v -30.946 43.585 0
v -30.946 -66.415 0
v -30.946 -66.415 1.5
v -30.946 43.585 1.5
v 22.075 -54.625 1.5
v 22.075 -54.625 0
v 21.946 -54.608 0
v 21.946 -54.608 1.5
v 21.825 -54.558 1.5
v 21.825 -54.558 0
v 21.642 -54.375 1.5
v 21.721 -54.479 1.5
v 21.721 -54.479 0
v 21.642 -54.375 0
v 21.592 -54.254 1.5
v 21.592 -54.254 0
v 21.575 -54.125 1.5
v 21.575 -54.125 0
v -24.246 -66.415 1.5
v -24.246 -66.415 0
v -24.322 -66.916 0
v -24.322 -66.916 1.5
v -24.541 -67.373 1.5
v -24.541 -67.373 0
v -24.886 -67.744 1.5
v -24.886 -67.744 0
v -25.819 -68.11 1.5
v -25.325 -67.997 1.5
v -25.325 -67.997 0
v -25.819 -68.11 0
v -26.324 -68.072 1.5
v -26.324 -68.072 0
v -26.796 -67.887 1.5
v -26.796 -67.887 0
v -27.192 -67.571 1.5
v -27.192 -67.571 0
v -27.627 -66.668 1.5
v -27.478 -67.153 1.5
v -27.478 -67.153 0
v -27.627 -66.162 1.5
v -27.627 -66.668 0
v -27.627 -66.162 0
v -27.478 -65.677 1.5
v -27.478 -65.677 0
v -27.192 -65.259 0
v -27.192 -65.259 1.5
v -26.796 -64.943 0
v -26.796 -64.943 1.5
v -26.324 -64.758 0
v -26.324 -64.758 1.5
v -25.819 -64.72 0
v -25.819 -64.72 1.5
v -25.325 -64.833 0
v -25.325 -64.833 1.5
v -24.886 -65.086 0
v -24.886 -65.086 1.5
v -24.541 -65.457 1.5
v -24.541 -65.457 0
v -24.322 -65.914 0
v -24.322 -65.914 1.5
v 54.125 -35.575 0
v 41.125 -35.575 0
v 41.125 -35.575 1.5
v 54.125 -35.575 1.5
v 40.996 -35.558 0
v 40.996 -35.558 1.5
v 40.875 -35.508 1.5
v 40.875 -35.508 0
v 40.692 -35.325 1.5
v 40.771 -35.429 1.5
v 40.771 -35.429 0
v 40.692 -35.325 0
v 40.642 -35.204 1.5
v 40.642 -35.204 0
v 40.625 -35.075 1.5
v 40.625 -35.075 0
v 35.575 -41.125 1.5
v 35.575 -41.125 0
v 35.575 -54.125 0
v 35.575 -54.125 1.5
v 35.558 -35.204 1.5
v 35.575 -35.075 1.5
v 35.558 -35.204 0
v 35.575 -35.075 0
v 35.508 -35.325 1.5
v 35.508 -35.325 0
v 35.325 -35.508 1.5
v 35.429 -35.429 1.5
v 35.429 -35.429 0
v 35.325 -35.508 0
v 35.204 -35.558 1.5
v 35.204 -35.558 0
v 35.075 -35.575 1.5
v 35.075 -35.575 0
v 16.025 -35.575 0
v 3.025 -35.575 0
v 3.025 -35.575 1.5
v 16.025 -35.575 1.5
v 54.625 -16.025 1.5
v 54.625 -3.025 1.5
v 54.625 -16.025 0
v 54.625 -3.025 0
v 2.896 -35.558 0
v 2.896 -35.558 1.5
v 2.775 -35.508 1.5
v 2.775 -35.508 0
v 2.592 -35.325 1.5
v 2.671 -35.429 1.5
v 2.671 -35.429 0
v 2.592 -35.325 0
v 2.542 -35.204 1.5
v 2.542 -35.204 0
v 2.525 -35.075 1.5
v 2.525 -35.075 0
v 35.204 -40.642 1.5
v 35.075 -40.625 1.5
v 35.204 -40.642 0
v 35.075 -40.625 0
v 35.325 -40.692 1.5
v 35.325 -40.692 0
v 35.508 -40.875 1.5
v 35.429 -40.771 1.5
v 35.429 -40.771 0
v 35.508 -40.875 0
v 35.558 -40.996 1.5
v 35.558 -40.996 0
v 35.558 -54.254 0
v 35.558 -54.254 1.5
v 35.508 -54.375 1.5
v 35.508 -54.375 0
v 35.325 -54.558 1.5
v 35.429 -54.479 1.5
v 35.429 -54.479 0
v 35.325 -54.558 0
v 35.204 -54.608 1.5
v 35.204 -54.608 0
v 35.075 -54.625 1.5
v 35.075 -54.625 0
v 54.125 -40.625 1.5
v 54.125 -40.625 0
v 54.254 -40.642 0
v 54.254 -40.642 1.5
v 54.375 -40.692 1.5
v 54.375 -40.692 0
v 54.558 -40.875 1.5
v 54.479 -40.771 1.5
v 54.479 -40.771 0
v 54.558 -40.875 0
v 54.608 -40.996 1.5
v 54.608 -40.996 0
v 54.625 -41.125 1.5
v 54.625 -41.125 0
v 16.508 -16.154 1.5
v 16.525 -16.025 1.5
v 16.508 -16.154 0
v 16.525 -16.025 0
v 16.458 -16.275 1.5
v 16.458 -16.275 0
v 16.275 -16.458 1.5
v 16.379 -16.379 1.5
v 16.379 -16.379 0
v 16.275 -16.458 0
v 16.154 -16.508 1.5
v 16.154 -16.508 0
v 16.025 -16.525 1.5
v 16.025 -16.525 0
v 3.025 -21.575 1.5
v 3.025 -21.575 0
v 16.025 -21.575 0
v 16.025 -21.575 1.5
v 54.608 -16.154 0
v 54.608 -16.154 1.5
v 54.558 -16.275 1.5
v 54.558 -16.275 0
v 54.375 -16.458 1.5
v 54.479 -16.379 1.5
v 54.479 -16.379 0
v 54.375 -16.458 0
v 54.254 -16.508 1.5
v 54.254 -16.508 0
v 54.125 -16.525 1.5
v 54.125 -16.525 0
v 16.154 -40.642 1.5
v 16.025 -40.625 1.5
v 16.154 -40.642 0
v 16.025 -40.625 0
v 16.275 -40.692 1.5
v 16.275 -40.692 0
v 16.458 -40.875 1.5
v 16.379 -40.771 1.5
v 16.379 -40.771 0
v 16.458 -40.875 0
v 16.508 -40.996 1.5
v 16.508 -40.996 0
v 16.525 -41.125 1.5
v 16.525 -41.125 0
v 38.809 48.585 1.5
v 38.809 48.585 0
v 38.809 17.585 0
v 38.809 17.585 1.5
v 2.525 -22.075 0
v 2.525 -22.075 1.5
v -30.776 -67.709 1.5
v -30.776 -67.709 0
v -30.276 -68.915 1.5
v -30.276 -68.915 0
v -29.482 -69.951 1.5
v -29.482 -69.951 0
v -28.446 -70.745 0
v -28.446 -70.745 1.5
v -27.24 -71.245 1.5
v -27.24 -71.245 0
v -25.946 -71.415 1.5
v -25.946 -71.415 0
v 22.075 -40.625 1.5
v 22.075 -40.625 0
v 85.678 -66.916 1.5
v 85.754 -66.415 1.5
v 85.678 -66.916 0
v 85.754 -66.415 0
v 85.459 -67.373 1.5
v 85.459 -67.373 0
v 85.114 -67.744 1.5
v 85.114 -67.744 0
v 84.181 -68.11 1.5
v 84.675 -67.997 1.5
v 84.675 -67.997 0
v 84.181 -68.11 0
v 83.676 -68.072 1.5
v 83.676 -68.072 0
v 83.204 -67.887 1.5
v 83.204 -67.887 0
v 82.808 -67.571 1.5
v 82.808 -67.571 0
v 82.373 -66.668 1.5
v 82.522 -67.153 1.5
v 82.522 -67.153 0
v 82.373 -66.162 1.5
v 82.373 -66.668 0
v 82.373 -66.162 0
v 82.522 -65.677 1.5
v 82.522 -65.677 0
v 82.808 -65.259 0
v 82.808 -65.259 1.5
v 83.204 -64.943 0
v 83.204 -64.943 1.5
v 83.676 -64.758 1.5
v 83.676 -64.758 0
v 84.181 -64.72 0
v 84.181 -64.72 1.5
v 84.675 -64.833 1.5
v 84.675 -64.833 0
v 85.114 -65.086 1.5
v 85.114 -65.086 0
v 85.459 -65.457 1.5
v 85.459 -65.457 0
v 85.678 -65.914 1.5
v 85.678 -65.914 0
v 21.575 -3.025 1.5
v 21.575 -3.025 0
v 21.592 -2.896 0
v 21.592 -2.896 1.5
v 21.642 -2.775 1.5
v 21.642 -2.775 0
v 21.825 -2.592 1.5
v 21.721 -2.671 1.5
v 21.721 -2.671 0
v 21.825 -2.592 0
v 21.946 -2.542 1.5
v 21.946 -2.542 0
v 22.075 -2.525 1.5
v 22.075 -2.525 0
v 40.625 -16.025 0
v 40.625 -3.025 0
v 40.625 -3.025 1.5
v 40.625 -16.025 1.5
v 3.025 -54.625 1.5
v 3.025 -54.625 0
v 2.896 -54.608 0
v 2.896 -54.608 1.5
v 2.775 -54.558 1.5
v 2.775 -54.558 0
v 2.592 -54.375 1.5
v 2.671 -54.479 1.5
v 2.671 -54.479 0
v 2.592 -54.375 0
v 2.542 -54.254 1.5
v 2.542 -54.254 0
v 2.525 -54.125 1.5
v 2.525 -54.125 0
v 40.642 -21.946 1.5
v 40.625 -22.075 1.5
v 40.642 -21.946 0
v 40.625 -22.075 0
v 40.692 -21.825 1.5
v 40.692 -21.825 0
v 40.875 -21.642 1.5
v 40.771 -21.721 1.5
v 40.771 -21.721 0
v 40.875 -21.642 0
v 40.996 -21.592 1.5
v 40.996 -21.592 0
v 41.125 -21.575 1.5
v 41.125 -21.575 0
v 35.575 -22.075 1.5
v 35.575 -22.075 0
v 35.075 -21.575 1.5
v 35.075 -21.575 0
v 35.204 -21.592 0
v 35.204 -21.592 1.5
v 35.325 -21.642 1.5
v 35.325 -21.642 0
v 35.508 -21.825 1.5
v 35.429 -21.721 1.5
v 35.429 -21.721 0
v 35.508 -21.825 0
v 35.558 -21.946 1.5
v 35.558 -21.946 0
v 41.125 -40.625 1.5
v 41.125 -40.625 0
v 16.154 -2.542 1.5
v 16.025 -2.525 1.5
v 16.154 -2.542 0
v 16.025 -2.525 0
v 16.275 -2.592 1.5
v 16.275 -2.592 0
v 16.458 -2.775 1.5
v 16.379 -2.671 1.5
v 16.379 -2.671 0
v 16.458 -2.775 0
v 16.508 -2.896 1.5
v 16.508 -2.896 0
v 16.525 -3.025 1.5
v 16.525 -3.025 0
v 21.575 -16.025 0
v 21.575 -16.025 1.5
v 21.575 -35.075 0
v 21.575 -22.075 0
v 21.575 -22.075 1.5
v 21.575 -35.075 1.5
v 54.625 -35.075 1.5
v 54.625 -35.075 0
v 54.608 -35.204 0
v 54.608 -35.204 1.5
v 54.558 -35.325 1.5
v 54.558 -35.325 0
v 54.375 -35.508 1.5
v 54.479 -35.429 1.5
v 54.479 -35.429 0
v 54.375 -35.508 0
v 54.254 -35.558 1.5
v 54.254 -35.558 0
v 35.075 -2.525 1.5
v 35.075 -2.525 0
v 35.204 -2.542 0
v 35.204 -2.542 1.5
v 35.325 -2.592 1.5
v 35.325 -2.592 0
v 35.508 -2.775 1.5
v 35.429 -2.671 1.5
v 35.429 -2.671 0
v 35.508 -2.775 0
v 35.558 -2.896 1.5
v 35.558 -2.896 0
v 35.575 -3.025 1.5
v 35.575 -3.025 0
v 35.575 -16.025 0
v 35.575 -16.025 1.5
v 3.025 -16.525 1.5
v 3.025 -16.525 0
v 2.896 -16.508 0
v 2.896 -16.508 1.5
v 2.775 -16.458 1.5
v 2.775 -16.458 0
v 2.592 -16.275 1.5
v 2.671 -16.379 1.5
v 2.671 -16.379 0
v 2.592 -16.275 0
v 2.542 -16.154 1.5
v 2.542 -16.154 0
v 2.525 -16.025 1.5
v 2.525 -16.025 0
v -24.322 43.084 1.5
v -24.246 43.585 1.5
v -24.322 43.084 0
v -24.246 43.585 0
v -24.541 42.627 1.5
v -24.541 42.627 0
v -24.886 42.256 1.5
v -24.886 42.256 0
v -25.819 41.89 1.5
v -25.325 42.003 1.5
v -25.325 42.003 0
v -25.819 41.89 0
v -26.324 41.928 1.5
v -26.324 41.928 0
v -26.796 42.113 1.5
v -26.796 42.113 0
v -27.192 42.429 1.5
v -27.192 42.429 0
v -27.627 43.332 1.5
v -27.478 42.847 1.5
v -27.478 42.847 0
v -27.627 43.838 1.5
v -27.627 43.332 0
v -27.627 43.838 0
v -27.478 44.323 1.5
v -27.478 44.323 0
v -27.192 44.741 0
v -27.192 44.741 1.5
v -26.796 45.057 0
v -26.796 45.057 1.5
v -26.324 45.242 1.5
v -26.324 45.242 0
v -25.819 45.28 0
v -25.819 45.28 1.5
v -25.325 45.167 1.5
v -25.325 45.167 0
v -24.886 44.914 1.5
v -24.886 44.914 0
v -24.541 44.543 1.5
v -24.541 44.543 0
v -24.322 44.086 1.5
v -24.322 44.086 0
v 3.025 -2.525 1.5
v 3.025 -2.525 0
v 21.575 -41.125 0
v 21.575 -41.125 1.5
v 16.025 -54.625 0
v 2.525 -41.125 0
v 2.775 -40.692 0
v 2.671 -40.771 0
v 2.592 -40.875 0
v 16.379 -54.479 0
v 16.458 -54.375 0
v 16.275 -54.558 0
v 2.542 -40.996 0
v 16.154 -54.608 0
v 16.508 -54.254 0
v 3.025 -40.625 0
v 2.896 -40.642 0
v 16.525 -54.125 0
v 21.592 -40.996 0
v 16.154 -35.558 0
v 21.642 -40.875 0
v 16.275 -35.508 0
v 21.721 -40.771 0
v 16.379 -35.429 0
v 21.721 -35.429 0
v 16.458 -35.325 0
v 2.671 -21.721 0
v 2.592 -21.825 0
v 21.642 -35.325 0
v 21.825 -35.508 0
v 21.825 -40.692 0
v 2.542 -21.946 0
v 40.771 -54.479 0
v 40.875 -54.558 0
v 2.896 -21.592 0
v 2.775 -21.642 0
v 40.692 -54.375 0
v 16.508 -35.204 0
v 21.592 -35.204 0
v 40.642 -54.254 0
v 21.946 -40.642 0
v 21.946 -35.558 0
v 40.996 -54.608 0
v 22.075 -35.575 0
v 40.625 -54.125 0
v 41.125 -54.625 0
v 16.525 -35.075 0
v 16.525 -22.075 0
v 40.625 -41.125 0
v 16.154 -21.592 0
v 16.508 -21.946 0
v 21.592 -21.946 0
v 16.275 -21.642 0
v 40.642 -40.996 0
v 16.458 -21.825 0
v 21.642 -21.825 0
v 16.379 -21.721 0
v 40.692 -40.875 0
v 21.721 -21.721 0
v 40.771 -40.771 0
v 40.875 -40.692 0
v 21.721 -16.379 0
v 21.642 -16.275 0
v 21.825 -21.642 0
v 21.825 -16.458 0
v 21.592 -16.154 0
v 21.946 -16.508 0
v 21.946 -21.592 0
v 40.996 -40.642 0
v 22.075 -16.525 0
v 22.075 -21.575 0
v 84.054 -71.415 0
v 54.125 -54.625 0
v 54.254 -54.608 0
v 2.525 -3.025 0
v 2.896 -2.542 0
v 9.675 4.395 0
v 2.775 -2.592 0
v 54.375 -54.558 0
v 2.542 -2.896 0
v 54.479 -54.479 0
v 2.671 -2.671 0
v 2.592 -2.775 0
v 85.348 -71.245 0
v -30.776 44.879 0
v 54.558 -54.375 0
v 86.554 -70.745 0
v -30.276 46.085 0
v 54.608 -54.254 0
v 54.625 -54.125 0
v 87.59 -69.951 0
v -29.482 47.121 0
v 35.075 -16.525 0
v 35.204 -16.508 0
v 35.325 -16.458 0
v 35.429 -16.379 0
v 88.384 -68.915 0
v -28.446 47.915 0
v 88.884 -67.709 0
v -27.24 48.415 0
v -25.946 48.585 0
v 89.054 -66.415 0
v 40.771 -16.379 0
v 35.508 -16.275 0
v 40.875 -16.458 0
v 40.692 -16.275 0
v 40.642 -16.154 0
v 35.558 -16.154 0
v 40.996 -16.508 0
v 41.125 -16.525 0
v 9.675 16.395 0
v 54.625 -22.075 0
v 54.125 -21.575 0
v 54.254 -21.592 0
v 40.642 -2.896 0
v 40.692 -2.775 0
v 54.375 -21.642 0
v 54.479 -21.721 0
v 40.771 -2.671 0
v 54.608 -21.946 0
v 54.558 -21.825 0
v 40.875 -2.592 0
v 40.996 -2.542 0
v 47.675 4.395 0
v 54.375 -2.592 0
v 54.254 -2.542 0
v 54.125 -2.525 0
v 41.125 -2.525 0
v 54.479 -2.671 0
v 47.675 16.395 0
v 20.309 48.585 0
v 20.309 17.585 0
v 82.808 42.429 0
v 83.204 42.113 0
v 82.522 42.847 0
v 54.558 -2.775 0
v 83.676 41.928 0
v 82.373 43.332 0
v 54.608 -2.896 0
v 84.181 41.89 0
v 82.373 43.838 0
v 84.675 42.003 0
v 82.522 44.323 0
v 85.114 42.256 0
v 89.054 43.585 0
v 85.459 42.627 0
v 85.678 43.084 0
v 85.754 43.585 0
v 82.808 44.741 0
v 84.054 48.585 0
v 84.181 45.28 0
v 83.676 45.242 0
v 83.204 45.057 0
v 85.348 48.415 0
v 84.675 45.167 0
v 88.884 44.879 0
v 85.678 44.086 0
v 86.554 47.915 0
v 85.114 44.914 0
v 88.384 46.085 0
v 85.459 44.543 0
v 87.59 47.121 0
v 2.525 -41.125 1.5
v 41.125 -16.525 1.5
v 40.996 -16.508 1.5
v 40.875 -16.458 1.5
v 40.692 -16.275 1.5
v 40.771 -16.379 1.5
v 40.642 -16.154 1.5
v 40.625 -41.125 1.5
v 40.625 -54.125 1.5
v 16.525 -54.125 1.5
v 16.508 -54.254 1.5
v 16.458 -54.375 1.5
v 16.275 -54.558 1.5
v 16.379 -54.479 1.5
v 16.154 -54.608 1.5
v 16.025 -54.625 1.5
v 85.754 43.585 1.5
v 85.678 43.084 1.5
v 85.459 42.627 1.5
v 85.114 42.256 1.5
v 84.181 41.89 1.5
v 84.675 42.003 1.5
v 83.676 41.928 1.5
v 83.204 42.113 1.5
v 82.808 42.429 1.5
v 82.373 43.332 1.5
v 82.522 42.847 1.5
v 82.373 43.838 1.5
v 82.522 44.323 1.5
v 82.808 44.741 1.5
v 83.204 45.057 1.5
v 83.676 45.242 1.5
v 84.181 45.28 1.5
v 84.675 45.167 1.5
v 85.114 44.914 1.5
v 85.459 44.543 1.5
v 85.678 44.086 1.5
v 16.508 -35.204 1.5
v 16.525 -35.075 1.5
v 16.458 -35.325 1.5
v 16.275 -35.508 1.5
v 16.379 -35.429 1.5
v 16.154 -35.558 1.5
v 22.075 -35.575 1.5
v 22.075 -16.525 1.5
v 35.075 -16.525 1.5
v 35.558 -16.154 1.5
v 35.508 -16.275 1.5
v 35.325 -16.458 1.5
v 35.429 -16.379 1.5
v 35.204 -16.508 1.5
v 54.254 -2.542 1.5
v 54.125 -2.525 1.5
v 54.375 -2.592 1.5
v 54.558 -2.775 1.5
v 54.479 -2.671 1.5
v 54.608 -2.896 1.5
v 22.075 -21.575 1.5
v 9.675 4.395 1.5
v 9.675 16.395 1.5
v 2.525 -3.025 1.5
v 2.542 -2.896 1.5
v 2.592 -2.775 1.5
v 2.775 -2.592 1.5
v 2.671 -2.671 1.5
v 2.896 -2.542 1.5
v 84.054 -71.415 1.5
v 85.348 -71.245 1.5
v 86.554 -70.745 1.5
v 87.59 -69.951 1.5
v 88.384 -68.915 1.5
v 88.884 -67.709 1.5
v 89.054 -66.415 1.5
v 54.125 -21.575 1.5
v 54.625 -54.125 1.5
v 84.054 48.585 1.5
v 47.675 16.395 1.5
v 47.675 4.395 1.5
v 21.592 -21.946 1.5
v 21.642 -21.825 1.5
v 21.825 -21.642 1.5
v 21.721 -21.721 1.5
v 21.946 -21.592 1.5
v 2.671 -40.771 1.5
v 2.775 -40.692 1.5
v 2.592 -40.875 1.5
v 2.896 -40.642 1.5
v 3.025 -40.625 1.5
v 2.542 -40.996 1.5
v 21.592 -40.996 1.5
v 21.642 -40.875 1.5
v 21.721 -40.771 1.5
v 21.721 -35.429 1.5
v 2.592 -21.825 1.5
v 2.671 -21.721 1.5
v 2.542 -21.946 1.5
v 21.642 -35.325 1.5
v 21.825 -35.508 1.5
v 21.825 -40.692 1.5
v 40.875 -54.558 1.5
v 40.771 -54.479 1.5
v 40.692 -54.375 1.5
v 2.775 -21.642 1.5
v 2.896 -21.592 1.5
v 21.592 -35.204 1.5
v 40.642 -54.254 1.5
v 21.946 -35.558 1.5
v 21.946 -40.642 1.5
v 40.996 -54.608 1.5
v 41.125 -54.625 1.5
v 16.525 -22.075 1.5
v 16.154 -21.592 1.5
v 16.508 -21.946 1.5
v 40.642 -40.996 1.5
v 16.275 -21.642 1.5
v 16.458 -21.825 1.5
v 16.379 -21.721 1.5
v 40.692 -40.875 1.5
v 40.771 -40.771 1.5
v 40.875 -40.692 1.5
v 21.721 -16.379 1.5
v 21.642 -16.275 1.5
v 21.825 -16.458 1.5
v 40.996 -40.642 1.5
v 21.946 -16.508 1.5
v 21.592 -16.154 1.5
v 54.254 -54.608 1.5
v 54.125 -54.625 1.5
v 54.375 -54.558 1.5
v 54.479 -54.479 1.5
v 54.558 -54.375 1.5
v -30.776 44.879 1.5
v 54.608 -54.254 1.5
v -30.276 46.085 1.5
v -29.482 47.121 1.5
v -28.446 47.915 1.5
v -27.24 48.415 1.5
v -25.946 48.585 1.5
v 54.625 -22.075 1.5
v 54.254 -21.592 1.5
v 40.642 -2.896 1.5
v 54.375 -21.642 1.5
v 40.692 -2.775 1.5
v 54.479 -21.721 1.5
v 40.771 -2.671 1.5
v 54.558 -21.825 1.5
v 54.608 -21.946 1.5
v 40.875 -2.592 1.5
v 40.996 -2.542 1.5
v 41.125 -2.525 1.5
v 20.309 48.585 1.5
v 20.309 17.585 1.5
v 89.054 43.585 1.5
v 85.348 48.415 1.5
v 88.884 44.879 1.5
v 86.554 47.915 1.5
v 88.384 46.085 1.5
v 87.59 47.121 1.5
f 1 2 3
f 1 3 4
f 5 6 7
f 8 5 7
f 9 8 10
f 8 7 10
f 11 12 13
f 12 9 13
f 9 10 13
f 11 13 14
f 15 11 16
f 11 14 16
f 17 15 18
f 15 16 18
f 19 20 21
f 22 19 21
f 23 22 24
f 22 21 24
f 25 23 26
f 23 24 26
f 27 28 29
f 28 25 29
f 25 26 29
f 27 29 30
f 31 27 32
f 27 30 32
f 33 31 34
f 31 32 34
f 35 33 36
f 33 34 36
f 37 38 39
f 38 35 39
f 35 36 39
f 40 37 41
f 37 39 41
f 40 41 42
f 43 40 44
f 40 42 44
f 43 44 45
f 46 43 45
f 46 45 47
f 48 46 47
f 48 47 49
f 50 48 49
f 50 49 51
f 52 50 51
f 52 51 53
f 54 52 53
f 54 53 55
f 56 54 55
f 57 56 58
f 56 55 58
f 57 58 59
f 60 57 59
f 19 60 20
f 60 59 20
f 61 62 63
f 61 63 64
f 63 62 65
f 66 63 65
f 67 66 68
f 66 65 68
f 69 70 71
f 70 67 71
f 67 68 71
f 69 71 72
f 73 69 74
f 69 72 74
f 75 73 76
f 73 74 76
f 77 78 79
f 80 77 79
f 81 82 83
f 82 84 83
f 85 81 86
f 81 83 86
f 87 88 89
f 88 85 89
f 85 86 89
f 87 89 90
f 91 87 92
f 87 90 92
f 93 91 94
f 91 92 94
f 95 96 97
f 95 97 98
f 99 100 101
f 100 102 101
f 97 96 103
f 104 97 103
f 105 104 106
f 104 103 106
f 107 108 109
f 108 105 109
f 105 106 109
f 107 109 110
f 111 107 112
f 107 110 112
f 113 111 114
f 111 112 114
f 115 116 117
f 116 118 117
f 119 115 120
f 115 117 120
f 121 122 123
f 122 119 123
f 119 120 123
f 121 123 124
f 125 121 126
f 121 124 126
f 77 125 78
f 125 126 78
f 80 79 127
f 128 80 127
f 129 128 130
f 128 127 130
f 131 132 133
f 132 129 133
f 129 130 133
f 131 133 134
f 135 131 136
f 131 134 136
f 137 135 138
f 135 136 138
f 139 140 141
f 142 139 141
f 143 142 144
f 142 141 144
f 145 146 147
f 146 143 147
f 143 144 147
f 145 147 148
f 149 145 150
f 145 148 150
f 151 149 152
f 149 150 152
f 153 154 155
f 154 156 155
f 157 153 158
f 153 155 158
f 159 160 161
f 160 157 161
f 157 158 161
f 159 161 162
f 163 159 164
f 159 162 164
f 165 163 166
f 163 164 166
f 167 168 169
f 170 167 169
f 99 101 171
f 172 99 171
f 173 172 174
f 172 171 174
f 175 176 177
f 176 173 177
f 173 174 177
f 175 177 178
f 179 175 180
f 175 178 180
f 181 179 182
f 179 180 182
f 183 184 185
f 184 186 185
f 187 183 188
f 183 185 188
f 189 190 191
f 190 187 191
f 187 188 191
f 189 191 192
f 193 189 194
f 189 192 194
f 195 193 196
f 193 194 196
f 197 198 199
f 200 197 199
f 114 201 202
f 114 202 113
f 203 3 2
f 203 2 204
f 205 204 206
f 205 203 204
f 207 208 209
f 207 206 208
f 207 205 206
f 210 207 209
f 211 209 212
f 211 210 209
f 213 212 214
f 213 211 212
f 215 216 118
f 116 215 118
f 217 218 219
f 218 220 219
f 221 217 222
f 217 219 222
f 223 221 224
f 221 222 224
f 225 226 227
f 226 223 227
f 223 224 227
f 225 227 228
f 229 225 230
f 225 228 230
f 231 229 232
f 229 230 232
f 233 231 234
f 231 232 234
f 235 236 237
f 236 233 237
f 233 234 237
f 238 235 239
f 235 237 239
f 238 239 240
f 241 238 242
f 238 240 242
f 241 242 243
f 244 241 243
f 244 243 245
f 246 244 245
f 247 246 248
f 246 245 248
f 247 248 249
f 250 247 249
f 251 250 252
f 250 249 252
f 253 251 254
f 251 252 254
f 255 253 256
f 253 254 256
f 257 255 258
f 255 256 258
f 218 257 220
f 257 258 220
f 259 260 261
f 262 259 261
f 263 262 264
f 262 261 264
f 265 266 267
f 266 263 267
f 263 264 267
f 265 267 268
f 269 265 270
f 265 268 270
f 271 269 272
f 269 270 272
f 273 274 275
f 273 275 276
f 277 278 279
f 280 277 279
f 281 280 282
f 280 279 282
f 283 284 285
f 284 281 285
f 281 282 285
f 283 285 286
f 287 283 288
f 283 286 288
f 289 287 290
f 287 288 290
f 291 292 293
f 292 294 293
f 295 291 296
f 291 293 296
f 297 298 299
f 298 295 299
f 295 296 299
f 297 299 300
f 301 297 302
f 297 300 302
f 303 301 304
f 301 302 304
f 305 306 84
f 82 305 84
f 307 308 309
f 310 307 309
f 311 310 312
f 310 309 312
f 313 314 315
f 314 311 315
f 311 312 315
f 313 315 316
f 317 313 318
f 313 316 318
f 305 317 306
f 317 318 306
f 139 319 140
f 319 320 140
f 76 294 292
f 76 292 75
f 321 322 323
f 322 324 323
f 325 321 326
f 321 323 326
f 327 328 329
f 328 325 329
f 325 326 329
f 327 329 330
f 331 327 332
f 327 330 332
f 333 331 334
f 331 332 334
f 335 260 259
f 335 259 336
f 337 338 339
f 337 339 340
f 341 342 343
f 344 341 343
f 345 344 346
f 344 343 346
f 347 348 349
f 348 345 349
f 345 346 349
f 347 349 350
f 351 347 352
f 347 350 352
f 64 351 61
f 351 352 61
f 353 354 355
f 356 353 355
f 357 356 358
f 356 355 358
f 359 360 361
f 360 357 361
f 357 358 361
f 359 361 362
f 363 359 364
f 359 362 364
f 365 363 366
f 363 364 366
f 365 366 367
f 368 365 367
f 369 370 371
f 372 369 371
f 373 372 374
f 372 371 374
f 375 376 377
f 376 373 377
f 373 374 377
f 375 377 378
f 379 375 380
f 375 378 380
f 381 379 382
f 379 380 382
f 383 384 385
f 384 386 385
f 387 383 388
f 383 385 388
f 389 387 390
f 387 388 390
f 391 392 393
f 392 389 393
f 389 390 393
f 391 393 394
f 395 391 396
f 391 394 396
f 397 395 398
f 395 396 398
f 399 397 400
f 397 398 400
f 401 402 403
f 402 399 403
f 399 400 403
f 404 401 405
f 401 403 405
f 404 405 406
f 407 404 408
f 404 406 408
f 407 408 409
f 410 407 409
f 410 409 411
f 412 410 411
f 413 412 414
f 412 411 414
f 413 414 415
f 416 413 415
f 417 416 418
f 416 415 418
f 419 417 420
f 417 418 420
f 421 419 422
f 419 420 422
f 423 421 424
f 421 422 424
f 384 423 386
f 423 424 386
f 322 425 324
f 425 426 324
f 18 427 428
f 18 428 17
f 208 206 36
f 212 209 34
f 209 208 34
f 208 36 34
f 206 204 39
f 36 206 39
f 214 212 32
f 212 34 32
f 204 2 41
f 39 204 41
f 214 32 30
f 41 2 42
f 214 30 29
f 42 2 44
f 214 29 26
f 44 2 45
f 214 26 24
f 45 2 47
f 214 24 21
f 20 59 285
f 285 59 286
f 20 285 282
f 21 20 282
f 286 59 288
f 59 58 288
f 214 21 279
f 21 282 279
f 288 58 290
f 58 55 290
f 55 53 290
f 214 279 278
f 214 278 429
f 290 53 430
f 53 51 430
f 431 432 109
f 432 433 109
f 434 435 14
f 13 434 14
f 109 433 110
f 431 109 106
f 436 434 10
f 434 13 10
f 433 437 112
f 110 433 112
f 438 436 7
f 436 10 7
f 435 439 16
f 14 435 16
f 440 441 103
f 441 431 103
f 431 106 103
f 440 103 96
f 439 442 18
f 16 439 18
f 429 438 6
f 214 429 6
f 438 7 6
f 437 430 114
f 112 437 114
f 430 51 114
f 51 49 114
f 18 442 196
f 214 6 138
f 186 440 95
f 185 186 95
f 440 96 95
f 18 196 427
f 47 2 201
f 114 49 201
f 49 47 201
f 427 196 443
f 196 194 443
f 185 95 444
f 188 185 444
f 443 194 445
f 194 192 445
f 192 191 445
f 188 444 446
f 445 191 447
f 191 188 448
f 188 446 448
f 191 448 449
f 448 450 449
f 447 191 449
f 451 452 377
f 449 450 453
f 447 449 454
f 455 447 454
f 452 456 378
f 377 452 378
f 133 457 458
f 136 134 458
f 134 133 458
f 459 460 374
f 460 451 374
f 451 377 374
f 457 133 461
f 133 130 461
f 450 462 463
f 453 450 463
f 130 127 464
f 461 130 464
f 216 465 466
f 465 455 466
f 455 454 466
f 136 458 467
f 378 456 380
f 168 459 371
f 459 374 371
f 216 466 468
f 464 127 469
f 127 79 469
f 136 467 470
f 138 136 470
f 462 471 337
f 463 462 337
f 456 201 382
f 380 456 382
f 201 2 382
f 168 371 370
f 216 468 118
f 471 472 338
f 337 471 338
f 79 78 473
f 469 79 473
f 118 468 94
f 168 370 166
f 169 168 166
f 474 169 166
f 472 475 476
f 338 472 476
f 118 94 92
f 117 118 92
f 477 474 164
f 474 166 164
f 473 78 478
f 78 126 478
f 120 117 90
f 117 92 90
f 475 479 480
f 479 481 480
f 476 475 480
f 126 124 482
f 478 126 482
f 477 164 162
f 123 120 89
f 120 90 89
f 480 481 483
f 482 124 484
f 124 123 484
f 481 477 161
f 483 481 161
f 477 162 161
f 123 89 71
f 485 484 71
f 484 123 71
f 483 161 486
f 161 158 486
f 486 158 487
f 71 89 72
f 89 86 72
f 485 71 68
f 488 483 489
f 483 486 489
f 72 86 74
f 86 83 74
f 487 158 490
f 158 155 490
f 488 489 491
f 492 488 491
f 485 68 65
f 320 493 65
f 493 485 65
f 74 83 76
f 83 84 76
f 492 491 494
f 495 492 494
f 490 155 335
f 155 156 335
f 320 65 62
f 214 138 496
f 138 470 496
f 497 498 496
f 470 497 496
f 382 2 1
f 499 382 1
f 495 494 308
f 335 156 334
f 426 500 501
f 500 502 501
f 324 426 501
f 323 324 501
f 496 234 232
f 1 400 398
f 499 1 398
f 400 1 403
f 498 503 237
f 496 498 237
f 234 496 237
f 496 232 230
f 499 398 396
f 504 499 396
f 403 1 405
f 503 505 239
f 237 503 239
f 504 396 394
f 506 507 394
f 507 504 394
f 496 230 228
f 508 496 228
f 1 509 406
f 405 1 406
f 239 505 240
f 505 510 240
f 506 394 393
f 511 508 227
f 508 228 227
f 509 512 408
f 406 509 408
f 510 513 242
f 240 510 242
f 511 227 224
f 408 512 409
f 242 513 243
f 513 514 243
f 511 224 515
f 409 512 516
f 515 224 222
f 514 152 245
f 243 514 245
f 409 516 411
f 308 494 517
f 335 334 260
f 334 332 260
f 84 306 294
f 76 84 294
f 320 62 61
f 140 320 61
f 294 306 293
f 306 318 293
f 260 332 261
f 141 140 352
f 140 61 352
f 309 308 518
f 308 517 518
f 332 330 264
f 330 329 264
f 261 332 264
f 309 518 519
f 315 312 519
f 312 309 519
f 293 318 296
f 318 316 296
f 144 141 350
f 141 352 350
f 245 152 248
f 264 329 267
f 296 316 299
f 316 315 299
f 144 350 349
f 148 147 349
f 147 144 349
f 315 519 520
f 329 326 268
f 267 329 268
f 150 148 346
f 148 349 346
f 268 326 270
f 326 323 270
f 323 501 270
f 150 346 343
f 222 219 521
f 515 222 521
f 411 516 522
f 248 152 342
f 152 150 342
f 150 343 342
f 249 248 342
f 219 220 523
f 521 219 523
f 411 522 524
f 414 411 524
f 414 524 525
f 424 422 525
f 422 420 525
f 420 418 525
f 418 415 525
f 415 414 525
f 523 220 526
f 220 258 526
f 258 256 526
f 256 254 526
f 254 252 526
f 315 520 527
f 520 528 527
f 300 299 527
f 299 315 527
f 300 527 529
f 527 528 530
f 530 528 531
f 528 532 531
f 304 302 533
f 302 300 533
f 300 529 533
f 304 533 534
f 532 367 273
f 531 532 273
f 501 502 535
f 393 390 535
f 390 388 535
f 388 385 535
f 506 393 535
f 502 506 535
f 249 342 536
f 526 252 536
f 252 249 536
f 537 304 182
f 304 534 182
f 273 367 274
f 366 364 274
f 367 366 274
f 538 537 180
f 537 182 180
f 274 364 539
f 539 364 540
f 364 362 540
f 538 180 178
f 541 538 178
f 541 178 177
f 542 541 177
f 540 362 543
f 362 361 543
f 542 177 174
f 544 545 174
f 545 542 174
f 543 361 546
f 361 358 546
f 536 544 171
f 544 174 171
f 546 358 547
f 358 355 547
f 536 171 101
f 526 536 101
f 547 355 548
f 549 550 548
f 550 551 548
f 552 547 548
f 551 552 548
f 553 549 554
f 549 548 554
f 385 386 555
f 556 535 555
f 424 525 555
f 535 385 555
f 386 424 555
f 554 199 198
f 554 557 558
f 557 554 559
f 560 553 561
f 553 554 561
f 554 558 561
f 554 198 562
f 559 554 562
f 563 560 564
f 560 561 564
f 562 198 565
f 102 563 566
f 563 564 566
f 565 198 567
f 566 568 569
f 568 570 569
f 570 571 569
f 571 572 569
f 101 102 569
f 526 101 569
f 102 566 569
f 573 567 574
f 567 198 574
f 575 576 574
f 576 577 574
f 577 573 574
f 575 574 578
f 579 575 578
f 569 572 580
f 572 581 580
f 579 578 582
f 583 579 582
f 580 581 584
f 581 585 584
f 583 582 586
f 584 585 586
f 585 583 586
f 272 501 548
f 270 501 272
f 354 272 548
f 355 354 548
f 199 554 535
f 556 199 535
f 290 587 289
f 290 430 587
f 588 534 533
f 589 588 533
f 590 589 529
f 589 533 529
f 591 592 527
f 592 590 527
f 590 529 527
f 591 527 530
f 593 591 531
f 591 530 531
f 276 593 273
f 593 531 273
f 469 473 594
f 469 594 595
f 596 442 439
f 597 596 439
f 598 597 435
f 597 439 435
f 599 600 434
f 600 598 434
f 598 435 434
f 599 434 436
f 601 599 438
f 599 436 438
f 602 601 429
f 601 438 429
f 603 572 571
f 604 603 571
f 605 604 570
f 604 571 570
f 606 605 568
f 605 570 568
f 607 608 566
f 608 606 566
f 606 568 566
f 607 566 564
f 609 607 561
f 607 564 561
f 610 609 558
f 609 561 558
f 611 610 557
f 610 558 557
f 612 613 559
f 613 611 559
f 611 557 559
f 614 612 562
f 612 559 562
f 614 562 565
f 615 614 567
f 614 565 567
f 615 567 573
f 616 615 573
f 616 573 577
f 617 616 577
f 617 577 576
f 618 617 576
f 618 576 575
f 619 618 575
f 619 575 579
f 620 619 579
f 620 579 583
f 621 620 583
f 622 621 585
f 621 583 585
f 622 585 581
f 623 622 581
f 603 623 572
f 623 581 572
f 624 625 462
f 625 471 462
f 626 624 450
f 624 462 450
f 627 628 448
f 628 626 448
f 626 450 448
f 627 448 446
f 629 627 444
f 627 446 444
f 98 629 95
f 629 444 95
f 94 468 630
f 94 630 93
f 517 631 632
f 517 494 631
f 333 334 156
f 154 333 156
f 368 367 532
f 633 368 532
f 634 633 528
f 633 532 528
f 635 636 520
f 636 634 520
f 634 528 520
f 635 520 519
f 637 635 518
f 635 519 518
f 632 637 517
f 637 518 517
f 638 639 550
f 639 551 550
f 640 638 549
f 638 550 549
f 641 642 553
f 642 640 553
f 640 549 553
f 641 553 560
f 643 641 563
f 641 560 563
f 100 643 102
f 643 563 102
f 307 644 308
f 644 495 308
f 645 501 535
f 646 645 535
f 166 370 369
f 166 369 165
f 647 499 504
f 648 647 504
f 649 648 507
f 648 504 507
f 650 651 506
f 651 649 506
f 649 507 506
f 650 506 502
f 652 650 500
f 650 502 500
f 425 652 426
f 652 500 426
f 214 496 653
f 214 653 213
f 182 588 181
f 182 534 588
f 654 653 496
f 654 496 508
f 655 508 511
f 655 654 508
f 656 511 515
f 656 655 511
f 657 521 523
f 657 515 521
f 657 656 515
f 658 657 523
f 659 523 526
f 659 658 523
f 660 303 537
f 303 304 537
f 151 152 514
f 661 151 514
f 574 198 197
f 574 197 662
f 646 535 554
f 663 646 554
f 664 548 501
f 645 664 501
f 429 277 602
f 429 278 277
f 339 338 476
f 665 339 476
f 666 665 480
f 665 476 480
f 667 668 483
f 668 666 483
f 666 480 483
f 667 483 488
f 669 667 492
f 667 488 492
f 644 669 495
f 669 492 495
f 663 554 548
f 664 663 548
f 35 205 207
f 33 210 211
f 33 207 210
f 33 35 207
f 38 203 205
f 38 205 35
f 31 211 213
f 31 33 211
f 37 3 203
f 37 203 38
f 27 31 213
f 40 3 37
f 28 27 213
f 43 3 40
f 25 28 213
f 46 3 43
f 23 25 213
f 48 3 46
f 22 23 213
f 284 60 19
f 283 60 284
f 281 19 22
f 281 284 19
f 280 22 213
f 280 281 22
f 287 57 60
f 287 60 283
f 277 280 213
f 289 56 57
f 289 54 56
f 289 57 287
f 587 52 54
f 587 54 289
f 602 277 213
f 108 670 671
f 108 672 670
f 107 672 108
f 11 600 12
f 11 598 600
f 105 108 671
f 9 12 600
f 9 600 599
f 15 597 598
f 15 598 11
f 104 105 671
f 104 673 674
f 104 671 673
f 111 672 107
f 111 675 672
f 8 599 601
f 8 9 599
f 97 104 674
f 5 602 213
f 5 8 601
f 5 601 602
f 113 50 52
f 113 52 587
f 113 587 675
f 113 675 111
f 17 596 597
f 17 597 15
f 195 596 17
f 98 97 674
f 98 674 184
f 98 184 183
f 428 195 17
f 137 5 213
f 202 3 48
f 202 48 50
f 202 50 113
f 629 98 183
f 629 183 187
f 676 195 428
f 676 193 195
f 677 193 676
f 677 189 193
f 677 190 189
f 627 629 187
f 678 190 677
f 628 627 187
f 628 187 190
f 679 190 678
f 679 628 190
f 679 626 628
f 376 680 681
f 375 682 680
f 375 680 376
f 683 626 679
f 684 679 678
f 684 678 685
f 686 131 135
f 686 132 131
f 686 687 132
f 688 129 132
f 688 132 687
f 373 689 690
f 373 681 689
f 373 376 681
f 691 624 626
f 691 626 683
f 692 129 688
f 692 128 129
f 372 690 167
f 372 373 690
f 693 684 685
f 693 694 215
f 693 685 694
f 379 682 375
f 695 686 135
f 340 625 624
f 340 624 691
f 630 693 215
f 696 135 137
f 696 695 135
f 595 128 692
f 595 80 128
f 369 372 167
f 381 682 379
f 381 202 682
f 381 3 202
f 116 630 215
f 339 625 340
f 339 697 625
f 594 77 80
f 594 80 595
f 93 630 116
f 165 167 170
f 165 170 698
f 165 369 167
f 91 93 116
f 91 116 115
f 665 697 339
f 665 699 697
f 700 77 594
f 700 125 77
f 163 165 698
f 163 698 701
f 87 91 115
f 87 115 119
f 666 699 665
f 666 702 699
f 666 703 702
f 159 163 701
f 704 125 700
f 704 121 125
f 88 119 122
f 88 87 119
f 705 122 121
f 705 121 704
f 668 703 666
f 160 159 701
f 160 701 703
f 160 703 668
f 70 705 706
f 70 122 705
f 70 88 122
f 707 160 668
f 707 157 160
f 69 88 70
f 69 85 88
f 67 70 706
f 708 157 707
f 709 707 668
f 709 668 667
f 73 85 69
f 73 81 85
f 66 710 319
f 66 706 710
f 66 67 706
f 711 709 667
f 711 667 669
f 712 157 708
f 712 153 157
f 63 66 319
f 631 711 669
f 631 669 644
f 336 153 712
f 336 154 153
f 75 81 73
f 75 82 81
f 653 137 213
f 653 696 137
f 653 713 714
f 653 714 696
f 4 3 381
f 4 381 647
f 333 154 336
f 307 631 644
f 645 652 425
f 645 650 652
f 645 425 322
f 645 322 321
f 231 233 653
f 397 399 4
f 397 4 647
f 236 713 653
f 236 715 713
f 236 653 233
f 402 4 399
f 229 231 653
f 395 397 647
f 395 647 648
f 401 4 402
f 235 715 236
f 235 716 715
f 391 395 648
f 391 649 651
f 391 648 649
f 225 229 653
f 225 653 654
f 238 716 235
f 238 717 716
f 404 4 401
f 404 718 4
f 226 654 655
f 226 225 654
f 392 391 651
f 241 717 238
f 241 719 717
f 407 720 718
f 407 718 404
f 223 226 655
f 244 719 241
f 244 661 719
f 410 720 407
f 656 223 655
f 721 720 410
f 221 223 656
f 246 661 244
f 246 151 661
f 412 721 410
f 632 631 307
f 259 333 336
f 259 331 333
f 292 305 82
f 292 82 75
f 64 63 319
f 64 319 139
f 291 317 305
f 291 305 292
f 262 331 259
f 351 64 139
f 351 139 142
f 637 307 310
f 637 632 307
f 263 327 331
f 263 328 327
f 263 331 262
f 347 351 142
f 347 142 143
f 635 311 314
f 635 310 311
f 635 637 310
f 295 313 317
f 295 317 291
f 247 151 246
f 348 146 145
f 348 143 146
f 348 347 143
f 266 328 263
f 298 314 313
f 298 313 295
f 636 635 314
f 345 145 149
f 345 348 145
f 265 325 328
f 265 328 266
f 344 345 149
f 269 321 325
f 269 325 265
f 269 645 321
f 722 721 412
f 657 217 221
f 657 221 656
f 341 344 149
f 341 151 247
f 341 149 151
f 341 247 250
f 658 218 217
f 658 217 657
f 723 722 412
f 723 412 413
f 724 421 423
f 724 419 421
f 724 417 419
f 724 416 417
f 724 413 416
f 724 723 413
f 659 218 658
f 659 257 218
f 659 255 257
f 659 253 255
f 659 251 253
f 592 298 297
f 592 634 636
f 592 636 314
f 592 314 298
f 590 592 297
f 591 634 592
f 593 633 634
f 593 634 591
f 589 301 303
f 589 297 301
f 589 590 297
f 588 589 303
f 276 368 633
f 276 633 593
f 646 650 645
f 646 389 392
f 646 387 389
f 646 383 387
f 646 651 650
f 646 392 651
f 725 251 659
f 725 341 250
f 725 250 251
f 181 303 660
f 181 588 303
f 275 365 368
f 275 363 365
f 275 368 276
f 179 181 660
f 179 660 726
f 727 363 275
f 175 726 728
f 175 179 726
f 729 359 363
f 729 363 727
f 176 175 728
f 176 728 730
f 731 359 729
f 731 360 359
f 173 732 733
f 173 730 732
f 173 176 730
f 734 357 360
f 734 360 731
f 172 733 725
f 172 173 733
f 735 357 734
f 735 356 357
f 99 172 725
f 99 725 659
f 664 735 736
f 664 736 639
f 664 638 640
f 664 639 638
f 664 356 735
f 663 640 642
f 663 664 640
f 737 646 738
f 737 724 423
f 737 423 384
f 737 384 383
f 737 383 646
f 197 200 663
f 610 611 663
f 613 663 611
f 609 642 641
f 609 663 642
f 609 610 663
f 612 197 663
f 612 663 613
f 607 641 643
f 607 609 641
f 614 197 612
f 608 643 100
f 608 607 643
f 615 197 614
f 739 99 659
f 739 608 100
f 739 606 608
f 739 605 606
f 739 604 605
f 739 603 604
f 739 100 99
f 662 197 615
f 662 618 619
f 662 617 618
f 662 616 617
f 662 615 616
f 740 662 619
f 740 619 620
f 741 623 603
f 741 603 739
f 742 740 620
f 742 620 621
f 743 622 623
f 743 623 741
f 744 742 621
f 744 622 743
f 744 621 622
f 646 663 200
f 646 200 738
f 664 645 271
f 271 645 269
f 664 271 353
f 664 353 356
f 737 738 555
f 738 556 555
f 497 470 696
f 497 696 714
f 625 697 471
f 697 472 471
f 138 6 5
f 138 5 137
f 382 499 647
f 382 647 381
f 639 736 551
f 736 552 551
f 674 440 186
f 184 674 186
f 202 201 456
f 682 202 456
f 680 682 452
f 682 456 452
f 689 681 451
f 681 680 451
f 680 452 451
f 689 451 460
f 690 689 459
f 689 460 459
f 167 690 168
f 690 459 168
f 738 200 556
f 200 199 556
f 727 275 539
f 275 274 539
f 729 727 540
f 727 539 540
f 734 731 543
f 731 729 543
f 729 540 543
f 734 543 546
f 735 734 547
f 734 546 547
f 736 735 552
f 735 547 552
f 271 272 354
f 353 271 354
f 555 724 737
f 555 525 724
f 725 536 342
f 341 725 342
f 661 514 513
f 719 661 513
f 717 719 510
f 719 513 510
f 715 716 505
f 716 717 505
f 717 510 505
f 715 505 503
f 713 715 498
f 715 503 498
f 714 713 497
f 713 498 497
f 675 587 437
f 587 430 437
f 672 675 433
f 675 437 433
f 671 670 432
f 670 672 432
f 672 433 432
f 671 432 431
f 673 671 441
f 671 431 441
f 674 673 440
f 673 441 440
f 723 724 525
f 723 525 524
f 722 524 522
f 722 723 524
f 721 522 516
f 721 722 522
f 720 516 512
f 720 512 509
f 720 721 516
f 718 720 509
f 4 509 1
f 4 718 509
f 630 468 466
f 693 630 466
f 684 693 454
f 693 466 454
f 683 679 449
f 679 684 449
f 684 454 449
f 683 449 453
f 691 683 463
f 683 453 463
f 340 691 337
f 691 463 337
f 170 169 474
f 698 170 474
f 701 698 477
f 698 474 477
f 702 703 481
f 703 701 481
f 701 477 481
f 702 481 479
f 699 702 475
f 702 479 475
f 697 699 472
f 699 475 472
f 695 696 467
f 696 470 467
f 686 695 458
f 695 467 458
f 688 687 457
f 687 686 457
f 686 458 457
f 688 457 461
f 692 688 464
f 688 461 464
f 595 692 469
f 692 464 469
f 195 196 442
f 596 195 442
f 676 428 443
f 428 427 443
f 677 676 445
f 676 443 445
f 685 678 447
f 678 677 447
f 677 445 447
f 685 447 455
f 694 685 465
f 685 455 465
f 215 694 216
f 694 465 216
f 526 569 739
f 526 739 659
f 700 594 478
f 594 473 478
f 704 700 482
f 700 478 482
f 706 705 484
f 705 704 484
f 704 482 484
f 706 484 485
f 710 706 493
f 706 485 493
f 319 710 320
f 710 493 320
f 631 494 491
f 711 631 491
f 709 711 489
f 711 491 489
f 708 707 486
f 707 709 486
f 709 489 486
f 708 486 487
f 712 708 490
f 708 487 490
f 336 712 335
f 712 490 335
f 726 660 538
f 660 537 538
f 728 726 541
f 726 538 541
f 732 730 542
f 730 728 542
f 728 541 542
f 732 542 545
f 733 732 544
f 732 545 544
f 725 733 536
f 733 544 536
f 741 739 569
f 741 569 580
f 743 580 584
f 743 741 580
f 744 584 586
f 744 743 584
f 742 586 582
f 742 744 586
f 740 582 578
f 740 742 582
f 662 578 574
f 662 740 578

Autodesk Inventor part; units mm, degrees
ref_plane "YZ Plane" through (0, 0, 0) normal (1, 0, 0) x (0, 1, 0)
ref_plane "XZ Plane" through (0, 0, 0) normal (0, 1, 0) x (-1, 0, 0)
ref_plane "XY Plane" through (0, 0, 0) normal (0, 0, 1) x (1, 0, 0)
sketch "Sketch1" plane through (0, 0, 0) normal (0, 0, 1) x (1, 0, 0)
  point P0 (0, 0)
sketch "0" plane through (0, 0, 0) normal (0, 0, 1) x (1, 0, 0)
  line L0 (3.025, -2.525) -> (16.025, -2.525)
  line L1 (3.025, -16.525) -> (16.025, -16.525)
  line L2 (2.525, -3.025) -> (2.525, -16.025)
  line L3 (16.525, -3.025) -> (16.525, -16.025)
  arc A0 (3.025, -2.525) -> (2.525, -3.025) centre (3.025, -3.025) ccw
  arc A1 (16.525, -3.025) -> (16.025, -2.525) centre (16.025, -3.025) ccw
  arc A2 (2.525, -16.025) -> (3.025, -16.525) centre (3.025, -16.025) ccw
  arc A3 (16.025, -16.525) -> (16.525, -16.025) centre (16.025, -16.025) ccw
  line L4 (22.075, -2.525) -> (35.075, -2.525)
  line L5 (22.075, -16.525) -> (35.075, -16.525)
  line L6 (21.575, -3.025) -> (21.575, -16.025)
  line L7 (35.575, -3.025) -> (35.575, -16.025)
  arc A4 (22.075, -2.525) -> (21.575, -3.025) centre (22.075, -3.025) ccw
  arc A5 (35.575, -3.025) -> (35.075, -2.525) centre (35.075, -3.025) ccw
  arc A6 (21.575, -16.025) -> (22.075, -16.525) centre (22.075, -16.025) ccw
  arc A7 (35.075, -16.525) -> (35.575, -16.025) centre (35.075, -16.025) ccw
  line L8 (41.125, -2.525) -> (54.125, -2.525)
  line L9 (41.125, -16.525) -> (54.125, -16.525)
  line L10 (40.625, -3.025) -> (40.625, -16.025)
  line L11 (54.625, -3.025) -> (54.625, -16.025)
  arc A8 (41.125, -2.525) -> (40.625, -3.025) centre (41.125, -3.025) ccw
  arc A9 (54.625, -3.025) -> (54.125, -2.525) centre (54.125, -3.025) ccw
  arc A10 (40.625, -16.025) -> (41.125, -16.525) centre (41.125, -16.025) ccw
  arc A11 (54.125, -16.525) -> (54.625, -16.025) centre (54.125, -16.025) ccw
  line L12 (3.025, -21.575) -> (16.025, -21.575)
  line L13 (3.025, -35.575) -> (16.025, -35.575)
  line L14 (2.525, -22.075) -> (2.525, -35.075)
  line L15 (16.525, -22.075) -> (16.525, -35.075)
  arc A12 (3.025, -21.575) -> (2.525, -22.075) centre (3.025, -22.075) ccw
  arc A13 (16.525, -22.075) -> (16.025, -21.575) centre (16.025, -22.075) ccw
  arc A14 (2.525, -35.075) -> (3.025, -35.575) centre (3.025, -35.075) ccw
  arc A15 (16.025, -35.575) -> (16.525, -35.075) centre (16.025, -35.075) ccw
  line L16 (22.075, -21.575) -> (35.075, -21.575)
  line L17 (22.075, -35.575) -> (35.075, -35.575)
  line L18 (21.575, -22.075) -> (21.575, -35.075)
  line L19 (35.575, -22.075) -> (35.575, -35.075)
  arc A16 (22.075, -21.575) -> (21.575, -22.075) centre (22.075, -22.075) ccw
  arc A17 (35.575, -22.075) -> (35.075, -21.575) centre (35.075, -22.075) ccw
  arc A18 (21.575, -35.075) -> (22.075, -35.575) centre (22.075, -35.075) ccw
  arc A19 (35.075, -35.575) -> (35.575, -35.075) centre (35.075, -35.075) ccw
  line L20 (41.125, -21.575) -> (54.125, -21.575)
  line L21 (41.125, -35.575) -> (54.125, -35.575)
  line L22 (40.625, -22.075) -> (40.625, -35.075)
  line L23 (54.625, -22.075) -> (54.625, -35.075)
  arc A20 (41.125, -21.575) -> (40.625, -22.075) centre (41.125, -22.075) ccw
  arc A21 (54.625, -22.075) -> (54.125, -21.575) centre (54.125, -22.075) ccw
  arc A22 (40.625, -35.075) -> (41.125, -35.575) centre (41.125, -35.075) ccw
  arc A23 (54.125, -35.575) -> (54.625, -35.075) centre (54.125, -35.075) ccw
  line L24 (3.025, -40.625) -> (16.025, -40.625)
  line L25 (3.025, -54.625) -> (16.025, -54.625)
  line L26 (2.525, -41.125) -> (2.525, -54.125)
  line L27 (16.525, -41.125) -> (16.525, -54.125)
  arc A24 (3.025, -40.625) -> (2.525, -41.125) centre (3.025, -41.125) ccw
  arc A25 (16.525, -41.125) -> (16.025, -40.625) centre (16.025, -41.125) ccw
  arc A26 (2.525, -54.125) -> (3.025, -54.625) centre (3.025, -54.125) ccw
  arc A27 (16.025, -54.625) -> (16.525, -54.125) centre (16.025, -54.125) ccw
  line L28 (22.075, -40.625) -> (35.075, -40.625)
  line L29 (22.075, -54.625) -> (35.075, -54.625)
  line L30 (21.575, -41.125) -> (21.575, -54.125)
  line L31 (35.575, -41.125) -> (35.575, -54.125)
  arc A28 (22.075, -40.625) -> (21.575, -41.125) centre (22.075, -41.125) ccw
  arc A29 (35.575, -41.125) -> (35.075, -40.625) centre (35.075, -41.125) ccw
  arc A30 (21.575, -54.125) -> (22.075, -54.625) centre (22.075, -54.125) ccw
  arc A31 (35.075, -54.625) -> (35.575, -54.125) centre (35.075, -54.125) ccw
  line L32 (41.125, -40.625) -> (54.125, -40.625)
  line L33 (41.125, -54.625) -> (54.125, -54.625)
  line L34 (40.625, -41.125) -> (40.625, -54.125)
  line L35 (54.625, -41.125) -> (54.625, -54.125)
  arc A32 (41.125, -40.625) -> (40.625, -41.125) centre (41.125, -41.125) ccw
  arc A33 (54.625, -41.125) -> (54.125, -40.625) centre (54.125, -41.125) ccw
  arc A34 (40.625, -54.125) -> (41.125, -54.625) centre (41.125, -54.125) ccw
  arc A35 (54.125, -54.625) -> (54.625, -54.125) centre (54.125, -54.125) ccw
  line L36 (-30.946, 48.585) -> (89.054, 48.585)
  line L37 (89.054, 48.585) -> (89.054, -71.415)
  line L38 (89.054, -71.415) -> (-30.946, -71.415)
  line L39 (-30.946, -71.415) -> (-30.946, 48.585)
  line L40 (20.309, 48.585) -> (38.809, 48.585)
  line L41 (38.809, 48.585) -> (38.809, 17.585)
  line L42 (38.809, 17.585) -> (20.309, 17.585)
  line L43 (20.309, 17.585) -> (20.309, 48.585)
  circle A36 centre (-25.946, 43.585) radius 1.7
  circle A37 centre (84.054, 43.585) radius 1.7
  circle A38 centre (84.054, -66.415) radius 1.7
  circle A39 centre (-25.946, -66.415) radius 1.7
  line L44 (9.675, 16.395) -> (47.675, 16.395)
  line L45 (47.675, 16.395) -> (47.675, 4.395)
  line L46 (47.675, 4.395) -> (9.675, 4.395)
  line L47 (9.675, 4.395) -> (9.675, 16.395)
  point P0 (9.525, -54.625)
  dimension "d0" = 120
  dimension "d1" = 120
  dimension "d2" = 33.471
  dimension "d3" = 16.79
  dimension "d4" = 18.5
  dimension "d5" = 31
  dimension "d6" = 51.255
  dimension "d7" = 3.4
  dimension "d8" = 3.4
  dimension "d9" = 3.4
  dimension "d10" = 3.4
  dimension "d11" = 5
  dimension "d12" = 5
  dimension "d13" = 5
  dimension "d14" = 5
  dimension "d15" = 5
  dimension "d16" = 5
  dimension "d17" = 5
  dimension "d18" = 5
  dimension "d19" = 38
  dimension "d20" = 12
  dimension "d21" = 40.621
  dimension "d22" = 32.19
extrude "Extrusion1" add sketch "0" along normal blind 1.5 contours L36 L43 L42 L41 L37 L38 L39
fillet "Fillet1" radius 5 4 edges at (-30.946, -71.415, 0.75) (89.054, -71.415, 0.75) (89.054, 48.585, 0.75) (-30.946, 48.585, 0.75)
properties part number "Top_Case_New"
